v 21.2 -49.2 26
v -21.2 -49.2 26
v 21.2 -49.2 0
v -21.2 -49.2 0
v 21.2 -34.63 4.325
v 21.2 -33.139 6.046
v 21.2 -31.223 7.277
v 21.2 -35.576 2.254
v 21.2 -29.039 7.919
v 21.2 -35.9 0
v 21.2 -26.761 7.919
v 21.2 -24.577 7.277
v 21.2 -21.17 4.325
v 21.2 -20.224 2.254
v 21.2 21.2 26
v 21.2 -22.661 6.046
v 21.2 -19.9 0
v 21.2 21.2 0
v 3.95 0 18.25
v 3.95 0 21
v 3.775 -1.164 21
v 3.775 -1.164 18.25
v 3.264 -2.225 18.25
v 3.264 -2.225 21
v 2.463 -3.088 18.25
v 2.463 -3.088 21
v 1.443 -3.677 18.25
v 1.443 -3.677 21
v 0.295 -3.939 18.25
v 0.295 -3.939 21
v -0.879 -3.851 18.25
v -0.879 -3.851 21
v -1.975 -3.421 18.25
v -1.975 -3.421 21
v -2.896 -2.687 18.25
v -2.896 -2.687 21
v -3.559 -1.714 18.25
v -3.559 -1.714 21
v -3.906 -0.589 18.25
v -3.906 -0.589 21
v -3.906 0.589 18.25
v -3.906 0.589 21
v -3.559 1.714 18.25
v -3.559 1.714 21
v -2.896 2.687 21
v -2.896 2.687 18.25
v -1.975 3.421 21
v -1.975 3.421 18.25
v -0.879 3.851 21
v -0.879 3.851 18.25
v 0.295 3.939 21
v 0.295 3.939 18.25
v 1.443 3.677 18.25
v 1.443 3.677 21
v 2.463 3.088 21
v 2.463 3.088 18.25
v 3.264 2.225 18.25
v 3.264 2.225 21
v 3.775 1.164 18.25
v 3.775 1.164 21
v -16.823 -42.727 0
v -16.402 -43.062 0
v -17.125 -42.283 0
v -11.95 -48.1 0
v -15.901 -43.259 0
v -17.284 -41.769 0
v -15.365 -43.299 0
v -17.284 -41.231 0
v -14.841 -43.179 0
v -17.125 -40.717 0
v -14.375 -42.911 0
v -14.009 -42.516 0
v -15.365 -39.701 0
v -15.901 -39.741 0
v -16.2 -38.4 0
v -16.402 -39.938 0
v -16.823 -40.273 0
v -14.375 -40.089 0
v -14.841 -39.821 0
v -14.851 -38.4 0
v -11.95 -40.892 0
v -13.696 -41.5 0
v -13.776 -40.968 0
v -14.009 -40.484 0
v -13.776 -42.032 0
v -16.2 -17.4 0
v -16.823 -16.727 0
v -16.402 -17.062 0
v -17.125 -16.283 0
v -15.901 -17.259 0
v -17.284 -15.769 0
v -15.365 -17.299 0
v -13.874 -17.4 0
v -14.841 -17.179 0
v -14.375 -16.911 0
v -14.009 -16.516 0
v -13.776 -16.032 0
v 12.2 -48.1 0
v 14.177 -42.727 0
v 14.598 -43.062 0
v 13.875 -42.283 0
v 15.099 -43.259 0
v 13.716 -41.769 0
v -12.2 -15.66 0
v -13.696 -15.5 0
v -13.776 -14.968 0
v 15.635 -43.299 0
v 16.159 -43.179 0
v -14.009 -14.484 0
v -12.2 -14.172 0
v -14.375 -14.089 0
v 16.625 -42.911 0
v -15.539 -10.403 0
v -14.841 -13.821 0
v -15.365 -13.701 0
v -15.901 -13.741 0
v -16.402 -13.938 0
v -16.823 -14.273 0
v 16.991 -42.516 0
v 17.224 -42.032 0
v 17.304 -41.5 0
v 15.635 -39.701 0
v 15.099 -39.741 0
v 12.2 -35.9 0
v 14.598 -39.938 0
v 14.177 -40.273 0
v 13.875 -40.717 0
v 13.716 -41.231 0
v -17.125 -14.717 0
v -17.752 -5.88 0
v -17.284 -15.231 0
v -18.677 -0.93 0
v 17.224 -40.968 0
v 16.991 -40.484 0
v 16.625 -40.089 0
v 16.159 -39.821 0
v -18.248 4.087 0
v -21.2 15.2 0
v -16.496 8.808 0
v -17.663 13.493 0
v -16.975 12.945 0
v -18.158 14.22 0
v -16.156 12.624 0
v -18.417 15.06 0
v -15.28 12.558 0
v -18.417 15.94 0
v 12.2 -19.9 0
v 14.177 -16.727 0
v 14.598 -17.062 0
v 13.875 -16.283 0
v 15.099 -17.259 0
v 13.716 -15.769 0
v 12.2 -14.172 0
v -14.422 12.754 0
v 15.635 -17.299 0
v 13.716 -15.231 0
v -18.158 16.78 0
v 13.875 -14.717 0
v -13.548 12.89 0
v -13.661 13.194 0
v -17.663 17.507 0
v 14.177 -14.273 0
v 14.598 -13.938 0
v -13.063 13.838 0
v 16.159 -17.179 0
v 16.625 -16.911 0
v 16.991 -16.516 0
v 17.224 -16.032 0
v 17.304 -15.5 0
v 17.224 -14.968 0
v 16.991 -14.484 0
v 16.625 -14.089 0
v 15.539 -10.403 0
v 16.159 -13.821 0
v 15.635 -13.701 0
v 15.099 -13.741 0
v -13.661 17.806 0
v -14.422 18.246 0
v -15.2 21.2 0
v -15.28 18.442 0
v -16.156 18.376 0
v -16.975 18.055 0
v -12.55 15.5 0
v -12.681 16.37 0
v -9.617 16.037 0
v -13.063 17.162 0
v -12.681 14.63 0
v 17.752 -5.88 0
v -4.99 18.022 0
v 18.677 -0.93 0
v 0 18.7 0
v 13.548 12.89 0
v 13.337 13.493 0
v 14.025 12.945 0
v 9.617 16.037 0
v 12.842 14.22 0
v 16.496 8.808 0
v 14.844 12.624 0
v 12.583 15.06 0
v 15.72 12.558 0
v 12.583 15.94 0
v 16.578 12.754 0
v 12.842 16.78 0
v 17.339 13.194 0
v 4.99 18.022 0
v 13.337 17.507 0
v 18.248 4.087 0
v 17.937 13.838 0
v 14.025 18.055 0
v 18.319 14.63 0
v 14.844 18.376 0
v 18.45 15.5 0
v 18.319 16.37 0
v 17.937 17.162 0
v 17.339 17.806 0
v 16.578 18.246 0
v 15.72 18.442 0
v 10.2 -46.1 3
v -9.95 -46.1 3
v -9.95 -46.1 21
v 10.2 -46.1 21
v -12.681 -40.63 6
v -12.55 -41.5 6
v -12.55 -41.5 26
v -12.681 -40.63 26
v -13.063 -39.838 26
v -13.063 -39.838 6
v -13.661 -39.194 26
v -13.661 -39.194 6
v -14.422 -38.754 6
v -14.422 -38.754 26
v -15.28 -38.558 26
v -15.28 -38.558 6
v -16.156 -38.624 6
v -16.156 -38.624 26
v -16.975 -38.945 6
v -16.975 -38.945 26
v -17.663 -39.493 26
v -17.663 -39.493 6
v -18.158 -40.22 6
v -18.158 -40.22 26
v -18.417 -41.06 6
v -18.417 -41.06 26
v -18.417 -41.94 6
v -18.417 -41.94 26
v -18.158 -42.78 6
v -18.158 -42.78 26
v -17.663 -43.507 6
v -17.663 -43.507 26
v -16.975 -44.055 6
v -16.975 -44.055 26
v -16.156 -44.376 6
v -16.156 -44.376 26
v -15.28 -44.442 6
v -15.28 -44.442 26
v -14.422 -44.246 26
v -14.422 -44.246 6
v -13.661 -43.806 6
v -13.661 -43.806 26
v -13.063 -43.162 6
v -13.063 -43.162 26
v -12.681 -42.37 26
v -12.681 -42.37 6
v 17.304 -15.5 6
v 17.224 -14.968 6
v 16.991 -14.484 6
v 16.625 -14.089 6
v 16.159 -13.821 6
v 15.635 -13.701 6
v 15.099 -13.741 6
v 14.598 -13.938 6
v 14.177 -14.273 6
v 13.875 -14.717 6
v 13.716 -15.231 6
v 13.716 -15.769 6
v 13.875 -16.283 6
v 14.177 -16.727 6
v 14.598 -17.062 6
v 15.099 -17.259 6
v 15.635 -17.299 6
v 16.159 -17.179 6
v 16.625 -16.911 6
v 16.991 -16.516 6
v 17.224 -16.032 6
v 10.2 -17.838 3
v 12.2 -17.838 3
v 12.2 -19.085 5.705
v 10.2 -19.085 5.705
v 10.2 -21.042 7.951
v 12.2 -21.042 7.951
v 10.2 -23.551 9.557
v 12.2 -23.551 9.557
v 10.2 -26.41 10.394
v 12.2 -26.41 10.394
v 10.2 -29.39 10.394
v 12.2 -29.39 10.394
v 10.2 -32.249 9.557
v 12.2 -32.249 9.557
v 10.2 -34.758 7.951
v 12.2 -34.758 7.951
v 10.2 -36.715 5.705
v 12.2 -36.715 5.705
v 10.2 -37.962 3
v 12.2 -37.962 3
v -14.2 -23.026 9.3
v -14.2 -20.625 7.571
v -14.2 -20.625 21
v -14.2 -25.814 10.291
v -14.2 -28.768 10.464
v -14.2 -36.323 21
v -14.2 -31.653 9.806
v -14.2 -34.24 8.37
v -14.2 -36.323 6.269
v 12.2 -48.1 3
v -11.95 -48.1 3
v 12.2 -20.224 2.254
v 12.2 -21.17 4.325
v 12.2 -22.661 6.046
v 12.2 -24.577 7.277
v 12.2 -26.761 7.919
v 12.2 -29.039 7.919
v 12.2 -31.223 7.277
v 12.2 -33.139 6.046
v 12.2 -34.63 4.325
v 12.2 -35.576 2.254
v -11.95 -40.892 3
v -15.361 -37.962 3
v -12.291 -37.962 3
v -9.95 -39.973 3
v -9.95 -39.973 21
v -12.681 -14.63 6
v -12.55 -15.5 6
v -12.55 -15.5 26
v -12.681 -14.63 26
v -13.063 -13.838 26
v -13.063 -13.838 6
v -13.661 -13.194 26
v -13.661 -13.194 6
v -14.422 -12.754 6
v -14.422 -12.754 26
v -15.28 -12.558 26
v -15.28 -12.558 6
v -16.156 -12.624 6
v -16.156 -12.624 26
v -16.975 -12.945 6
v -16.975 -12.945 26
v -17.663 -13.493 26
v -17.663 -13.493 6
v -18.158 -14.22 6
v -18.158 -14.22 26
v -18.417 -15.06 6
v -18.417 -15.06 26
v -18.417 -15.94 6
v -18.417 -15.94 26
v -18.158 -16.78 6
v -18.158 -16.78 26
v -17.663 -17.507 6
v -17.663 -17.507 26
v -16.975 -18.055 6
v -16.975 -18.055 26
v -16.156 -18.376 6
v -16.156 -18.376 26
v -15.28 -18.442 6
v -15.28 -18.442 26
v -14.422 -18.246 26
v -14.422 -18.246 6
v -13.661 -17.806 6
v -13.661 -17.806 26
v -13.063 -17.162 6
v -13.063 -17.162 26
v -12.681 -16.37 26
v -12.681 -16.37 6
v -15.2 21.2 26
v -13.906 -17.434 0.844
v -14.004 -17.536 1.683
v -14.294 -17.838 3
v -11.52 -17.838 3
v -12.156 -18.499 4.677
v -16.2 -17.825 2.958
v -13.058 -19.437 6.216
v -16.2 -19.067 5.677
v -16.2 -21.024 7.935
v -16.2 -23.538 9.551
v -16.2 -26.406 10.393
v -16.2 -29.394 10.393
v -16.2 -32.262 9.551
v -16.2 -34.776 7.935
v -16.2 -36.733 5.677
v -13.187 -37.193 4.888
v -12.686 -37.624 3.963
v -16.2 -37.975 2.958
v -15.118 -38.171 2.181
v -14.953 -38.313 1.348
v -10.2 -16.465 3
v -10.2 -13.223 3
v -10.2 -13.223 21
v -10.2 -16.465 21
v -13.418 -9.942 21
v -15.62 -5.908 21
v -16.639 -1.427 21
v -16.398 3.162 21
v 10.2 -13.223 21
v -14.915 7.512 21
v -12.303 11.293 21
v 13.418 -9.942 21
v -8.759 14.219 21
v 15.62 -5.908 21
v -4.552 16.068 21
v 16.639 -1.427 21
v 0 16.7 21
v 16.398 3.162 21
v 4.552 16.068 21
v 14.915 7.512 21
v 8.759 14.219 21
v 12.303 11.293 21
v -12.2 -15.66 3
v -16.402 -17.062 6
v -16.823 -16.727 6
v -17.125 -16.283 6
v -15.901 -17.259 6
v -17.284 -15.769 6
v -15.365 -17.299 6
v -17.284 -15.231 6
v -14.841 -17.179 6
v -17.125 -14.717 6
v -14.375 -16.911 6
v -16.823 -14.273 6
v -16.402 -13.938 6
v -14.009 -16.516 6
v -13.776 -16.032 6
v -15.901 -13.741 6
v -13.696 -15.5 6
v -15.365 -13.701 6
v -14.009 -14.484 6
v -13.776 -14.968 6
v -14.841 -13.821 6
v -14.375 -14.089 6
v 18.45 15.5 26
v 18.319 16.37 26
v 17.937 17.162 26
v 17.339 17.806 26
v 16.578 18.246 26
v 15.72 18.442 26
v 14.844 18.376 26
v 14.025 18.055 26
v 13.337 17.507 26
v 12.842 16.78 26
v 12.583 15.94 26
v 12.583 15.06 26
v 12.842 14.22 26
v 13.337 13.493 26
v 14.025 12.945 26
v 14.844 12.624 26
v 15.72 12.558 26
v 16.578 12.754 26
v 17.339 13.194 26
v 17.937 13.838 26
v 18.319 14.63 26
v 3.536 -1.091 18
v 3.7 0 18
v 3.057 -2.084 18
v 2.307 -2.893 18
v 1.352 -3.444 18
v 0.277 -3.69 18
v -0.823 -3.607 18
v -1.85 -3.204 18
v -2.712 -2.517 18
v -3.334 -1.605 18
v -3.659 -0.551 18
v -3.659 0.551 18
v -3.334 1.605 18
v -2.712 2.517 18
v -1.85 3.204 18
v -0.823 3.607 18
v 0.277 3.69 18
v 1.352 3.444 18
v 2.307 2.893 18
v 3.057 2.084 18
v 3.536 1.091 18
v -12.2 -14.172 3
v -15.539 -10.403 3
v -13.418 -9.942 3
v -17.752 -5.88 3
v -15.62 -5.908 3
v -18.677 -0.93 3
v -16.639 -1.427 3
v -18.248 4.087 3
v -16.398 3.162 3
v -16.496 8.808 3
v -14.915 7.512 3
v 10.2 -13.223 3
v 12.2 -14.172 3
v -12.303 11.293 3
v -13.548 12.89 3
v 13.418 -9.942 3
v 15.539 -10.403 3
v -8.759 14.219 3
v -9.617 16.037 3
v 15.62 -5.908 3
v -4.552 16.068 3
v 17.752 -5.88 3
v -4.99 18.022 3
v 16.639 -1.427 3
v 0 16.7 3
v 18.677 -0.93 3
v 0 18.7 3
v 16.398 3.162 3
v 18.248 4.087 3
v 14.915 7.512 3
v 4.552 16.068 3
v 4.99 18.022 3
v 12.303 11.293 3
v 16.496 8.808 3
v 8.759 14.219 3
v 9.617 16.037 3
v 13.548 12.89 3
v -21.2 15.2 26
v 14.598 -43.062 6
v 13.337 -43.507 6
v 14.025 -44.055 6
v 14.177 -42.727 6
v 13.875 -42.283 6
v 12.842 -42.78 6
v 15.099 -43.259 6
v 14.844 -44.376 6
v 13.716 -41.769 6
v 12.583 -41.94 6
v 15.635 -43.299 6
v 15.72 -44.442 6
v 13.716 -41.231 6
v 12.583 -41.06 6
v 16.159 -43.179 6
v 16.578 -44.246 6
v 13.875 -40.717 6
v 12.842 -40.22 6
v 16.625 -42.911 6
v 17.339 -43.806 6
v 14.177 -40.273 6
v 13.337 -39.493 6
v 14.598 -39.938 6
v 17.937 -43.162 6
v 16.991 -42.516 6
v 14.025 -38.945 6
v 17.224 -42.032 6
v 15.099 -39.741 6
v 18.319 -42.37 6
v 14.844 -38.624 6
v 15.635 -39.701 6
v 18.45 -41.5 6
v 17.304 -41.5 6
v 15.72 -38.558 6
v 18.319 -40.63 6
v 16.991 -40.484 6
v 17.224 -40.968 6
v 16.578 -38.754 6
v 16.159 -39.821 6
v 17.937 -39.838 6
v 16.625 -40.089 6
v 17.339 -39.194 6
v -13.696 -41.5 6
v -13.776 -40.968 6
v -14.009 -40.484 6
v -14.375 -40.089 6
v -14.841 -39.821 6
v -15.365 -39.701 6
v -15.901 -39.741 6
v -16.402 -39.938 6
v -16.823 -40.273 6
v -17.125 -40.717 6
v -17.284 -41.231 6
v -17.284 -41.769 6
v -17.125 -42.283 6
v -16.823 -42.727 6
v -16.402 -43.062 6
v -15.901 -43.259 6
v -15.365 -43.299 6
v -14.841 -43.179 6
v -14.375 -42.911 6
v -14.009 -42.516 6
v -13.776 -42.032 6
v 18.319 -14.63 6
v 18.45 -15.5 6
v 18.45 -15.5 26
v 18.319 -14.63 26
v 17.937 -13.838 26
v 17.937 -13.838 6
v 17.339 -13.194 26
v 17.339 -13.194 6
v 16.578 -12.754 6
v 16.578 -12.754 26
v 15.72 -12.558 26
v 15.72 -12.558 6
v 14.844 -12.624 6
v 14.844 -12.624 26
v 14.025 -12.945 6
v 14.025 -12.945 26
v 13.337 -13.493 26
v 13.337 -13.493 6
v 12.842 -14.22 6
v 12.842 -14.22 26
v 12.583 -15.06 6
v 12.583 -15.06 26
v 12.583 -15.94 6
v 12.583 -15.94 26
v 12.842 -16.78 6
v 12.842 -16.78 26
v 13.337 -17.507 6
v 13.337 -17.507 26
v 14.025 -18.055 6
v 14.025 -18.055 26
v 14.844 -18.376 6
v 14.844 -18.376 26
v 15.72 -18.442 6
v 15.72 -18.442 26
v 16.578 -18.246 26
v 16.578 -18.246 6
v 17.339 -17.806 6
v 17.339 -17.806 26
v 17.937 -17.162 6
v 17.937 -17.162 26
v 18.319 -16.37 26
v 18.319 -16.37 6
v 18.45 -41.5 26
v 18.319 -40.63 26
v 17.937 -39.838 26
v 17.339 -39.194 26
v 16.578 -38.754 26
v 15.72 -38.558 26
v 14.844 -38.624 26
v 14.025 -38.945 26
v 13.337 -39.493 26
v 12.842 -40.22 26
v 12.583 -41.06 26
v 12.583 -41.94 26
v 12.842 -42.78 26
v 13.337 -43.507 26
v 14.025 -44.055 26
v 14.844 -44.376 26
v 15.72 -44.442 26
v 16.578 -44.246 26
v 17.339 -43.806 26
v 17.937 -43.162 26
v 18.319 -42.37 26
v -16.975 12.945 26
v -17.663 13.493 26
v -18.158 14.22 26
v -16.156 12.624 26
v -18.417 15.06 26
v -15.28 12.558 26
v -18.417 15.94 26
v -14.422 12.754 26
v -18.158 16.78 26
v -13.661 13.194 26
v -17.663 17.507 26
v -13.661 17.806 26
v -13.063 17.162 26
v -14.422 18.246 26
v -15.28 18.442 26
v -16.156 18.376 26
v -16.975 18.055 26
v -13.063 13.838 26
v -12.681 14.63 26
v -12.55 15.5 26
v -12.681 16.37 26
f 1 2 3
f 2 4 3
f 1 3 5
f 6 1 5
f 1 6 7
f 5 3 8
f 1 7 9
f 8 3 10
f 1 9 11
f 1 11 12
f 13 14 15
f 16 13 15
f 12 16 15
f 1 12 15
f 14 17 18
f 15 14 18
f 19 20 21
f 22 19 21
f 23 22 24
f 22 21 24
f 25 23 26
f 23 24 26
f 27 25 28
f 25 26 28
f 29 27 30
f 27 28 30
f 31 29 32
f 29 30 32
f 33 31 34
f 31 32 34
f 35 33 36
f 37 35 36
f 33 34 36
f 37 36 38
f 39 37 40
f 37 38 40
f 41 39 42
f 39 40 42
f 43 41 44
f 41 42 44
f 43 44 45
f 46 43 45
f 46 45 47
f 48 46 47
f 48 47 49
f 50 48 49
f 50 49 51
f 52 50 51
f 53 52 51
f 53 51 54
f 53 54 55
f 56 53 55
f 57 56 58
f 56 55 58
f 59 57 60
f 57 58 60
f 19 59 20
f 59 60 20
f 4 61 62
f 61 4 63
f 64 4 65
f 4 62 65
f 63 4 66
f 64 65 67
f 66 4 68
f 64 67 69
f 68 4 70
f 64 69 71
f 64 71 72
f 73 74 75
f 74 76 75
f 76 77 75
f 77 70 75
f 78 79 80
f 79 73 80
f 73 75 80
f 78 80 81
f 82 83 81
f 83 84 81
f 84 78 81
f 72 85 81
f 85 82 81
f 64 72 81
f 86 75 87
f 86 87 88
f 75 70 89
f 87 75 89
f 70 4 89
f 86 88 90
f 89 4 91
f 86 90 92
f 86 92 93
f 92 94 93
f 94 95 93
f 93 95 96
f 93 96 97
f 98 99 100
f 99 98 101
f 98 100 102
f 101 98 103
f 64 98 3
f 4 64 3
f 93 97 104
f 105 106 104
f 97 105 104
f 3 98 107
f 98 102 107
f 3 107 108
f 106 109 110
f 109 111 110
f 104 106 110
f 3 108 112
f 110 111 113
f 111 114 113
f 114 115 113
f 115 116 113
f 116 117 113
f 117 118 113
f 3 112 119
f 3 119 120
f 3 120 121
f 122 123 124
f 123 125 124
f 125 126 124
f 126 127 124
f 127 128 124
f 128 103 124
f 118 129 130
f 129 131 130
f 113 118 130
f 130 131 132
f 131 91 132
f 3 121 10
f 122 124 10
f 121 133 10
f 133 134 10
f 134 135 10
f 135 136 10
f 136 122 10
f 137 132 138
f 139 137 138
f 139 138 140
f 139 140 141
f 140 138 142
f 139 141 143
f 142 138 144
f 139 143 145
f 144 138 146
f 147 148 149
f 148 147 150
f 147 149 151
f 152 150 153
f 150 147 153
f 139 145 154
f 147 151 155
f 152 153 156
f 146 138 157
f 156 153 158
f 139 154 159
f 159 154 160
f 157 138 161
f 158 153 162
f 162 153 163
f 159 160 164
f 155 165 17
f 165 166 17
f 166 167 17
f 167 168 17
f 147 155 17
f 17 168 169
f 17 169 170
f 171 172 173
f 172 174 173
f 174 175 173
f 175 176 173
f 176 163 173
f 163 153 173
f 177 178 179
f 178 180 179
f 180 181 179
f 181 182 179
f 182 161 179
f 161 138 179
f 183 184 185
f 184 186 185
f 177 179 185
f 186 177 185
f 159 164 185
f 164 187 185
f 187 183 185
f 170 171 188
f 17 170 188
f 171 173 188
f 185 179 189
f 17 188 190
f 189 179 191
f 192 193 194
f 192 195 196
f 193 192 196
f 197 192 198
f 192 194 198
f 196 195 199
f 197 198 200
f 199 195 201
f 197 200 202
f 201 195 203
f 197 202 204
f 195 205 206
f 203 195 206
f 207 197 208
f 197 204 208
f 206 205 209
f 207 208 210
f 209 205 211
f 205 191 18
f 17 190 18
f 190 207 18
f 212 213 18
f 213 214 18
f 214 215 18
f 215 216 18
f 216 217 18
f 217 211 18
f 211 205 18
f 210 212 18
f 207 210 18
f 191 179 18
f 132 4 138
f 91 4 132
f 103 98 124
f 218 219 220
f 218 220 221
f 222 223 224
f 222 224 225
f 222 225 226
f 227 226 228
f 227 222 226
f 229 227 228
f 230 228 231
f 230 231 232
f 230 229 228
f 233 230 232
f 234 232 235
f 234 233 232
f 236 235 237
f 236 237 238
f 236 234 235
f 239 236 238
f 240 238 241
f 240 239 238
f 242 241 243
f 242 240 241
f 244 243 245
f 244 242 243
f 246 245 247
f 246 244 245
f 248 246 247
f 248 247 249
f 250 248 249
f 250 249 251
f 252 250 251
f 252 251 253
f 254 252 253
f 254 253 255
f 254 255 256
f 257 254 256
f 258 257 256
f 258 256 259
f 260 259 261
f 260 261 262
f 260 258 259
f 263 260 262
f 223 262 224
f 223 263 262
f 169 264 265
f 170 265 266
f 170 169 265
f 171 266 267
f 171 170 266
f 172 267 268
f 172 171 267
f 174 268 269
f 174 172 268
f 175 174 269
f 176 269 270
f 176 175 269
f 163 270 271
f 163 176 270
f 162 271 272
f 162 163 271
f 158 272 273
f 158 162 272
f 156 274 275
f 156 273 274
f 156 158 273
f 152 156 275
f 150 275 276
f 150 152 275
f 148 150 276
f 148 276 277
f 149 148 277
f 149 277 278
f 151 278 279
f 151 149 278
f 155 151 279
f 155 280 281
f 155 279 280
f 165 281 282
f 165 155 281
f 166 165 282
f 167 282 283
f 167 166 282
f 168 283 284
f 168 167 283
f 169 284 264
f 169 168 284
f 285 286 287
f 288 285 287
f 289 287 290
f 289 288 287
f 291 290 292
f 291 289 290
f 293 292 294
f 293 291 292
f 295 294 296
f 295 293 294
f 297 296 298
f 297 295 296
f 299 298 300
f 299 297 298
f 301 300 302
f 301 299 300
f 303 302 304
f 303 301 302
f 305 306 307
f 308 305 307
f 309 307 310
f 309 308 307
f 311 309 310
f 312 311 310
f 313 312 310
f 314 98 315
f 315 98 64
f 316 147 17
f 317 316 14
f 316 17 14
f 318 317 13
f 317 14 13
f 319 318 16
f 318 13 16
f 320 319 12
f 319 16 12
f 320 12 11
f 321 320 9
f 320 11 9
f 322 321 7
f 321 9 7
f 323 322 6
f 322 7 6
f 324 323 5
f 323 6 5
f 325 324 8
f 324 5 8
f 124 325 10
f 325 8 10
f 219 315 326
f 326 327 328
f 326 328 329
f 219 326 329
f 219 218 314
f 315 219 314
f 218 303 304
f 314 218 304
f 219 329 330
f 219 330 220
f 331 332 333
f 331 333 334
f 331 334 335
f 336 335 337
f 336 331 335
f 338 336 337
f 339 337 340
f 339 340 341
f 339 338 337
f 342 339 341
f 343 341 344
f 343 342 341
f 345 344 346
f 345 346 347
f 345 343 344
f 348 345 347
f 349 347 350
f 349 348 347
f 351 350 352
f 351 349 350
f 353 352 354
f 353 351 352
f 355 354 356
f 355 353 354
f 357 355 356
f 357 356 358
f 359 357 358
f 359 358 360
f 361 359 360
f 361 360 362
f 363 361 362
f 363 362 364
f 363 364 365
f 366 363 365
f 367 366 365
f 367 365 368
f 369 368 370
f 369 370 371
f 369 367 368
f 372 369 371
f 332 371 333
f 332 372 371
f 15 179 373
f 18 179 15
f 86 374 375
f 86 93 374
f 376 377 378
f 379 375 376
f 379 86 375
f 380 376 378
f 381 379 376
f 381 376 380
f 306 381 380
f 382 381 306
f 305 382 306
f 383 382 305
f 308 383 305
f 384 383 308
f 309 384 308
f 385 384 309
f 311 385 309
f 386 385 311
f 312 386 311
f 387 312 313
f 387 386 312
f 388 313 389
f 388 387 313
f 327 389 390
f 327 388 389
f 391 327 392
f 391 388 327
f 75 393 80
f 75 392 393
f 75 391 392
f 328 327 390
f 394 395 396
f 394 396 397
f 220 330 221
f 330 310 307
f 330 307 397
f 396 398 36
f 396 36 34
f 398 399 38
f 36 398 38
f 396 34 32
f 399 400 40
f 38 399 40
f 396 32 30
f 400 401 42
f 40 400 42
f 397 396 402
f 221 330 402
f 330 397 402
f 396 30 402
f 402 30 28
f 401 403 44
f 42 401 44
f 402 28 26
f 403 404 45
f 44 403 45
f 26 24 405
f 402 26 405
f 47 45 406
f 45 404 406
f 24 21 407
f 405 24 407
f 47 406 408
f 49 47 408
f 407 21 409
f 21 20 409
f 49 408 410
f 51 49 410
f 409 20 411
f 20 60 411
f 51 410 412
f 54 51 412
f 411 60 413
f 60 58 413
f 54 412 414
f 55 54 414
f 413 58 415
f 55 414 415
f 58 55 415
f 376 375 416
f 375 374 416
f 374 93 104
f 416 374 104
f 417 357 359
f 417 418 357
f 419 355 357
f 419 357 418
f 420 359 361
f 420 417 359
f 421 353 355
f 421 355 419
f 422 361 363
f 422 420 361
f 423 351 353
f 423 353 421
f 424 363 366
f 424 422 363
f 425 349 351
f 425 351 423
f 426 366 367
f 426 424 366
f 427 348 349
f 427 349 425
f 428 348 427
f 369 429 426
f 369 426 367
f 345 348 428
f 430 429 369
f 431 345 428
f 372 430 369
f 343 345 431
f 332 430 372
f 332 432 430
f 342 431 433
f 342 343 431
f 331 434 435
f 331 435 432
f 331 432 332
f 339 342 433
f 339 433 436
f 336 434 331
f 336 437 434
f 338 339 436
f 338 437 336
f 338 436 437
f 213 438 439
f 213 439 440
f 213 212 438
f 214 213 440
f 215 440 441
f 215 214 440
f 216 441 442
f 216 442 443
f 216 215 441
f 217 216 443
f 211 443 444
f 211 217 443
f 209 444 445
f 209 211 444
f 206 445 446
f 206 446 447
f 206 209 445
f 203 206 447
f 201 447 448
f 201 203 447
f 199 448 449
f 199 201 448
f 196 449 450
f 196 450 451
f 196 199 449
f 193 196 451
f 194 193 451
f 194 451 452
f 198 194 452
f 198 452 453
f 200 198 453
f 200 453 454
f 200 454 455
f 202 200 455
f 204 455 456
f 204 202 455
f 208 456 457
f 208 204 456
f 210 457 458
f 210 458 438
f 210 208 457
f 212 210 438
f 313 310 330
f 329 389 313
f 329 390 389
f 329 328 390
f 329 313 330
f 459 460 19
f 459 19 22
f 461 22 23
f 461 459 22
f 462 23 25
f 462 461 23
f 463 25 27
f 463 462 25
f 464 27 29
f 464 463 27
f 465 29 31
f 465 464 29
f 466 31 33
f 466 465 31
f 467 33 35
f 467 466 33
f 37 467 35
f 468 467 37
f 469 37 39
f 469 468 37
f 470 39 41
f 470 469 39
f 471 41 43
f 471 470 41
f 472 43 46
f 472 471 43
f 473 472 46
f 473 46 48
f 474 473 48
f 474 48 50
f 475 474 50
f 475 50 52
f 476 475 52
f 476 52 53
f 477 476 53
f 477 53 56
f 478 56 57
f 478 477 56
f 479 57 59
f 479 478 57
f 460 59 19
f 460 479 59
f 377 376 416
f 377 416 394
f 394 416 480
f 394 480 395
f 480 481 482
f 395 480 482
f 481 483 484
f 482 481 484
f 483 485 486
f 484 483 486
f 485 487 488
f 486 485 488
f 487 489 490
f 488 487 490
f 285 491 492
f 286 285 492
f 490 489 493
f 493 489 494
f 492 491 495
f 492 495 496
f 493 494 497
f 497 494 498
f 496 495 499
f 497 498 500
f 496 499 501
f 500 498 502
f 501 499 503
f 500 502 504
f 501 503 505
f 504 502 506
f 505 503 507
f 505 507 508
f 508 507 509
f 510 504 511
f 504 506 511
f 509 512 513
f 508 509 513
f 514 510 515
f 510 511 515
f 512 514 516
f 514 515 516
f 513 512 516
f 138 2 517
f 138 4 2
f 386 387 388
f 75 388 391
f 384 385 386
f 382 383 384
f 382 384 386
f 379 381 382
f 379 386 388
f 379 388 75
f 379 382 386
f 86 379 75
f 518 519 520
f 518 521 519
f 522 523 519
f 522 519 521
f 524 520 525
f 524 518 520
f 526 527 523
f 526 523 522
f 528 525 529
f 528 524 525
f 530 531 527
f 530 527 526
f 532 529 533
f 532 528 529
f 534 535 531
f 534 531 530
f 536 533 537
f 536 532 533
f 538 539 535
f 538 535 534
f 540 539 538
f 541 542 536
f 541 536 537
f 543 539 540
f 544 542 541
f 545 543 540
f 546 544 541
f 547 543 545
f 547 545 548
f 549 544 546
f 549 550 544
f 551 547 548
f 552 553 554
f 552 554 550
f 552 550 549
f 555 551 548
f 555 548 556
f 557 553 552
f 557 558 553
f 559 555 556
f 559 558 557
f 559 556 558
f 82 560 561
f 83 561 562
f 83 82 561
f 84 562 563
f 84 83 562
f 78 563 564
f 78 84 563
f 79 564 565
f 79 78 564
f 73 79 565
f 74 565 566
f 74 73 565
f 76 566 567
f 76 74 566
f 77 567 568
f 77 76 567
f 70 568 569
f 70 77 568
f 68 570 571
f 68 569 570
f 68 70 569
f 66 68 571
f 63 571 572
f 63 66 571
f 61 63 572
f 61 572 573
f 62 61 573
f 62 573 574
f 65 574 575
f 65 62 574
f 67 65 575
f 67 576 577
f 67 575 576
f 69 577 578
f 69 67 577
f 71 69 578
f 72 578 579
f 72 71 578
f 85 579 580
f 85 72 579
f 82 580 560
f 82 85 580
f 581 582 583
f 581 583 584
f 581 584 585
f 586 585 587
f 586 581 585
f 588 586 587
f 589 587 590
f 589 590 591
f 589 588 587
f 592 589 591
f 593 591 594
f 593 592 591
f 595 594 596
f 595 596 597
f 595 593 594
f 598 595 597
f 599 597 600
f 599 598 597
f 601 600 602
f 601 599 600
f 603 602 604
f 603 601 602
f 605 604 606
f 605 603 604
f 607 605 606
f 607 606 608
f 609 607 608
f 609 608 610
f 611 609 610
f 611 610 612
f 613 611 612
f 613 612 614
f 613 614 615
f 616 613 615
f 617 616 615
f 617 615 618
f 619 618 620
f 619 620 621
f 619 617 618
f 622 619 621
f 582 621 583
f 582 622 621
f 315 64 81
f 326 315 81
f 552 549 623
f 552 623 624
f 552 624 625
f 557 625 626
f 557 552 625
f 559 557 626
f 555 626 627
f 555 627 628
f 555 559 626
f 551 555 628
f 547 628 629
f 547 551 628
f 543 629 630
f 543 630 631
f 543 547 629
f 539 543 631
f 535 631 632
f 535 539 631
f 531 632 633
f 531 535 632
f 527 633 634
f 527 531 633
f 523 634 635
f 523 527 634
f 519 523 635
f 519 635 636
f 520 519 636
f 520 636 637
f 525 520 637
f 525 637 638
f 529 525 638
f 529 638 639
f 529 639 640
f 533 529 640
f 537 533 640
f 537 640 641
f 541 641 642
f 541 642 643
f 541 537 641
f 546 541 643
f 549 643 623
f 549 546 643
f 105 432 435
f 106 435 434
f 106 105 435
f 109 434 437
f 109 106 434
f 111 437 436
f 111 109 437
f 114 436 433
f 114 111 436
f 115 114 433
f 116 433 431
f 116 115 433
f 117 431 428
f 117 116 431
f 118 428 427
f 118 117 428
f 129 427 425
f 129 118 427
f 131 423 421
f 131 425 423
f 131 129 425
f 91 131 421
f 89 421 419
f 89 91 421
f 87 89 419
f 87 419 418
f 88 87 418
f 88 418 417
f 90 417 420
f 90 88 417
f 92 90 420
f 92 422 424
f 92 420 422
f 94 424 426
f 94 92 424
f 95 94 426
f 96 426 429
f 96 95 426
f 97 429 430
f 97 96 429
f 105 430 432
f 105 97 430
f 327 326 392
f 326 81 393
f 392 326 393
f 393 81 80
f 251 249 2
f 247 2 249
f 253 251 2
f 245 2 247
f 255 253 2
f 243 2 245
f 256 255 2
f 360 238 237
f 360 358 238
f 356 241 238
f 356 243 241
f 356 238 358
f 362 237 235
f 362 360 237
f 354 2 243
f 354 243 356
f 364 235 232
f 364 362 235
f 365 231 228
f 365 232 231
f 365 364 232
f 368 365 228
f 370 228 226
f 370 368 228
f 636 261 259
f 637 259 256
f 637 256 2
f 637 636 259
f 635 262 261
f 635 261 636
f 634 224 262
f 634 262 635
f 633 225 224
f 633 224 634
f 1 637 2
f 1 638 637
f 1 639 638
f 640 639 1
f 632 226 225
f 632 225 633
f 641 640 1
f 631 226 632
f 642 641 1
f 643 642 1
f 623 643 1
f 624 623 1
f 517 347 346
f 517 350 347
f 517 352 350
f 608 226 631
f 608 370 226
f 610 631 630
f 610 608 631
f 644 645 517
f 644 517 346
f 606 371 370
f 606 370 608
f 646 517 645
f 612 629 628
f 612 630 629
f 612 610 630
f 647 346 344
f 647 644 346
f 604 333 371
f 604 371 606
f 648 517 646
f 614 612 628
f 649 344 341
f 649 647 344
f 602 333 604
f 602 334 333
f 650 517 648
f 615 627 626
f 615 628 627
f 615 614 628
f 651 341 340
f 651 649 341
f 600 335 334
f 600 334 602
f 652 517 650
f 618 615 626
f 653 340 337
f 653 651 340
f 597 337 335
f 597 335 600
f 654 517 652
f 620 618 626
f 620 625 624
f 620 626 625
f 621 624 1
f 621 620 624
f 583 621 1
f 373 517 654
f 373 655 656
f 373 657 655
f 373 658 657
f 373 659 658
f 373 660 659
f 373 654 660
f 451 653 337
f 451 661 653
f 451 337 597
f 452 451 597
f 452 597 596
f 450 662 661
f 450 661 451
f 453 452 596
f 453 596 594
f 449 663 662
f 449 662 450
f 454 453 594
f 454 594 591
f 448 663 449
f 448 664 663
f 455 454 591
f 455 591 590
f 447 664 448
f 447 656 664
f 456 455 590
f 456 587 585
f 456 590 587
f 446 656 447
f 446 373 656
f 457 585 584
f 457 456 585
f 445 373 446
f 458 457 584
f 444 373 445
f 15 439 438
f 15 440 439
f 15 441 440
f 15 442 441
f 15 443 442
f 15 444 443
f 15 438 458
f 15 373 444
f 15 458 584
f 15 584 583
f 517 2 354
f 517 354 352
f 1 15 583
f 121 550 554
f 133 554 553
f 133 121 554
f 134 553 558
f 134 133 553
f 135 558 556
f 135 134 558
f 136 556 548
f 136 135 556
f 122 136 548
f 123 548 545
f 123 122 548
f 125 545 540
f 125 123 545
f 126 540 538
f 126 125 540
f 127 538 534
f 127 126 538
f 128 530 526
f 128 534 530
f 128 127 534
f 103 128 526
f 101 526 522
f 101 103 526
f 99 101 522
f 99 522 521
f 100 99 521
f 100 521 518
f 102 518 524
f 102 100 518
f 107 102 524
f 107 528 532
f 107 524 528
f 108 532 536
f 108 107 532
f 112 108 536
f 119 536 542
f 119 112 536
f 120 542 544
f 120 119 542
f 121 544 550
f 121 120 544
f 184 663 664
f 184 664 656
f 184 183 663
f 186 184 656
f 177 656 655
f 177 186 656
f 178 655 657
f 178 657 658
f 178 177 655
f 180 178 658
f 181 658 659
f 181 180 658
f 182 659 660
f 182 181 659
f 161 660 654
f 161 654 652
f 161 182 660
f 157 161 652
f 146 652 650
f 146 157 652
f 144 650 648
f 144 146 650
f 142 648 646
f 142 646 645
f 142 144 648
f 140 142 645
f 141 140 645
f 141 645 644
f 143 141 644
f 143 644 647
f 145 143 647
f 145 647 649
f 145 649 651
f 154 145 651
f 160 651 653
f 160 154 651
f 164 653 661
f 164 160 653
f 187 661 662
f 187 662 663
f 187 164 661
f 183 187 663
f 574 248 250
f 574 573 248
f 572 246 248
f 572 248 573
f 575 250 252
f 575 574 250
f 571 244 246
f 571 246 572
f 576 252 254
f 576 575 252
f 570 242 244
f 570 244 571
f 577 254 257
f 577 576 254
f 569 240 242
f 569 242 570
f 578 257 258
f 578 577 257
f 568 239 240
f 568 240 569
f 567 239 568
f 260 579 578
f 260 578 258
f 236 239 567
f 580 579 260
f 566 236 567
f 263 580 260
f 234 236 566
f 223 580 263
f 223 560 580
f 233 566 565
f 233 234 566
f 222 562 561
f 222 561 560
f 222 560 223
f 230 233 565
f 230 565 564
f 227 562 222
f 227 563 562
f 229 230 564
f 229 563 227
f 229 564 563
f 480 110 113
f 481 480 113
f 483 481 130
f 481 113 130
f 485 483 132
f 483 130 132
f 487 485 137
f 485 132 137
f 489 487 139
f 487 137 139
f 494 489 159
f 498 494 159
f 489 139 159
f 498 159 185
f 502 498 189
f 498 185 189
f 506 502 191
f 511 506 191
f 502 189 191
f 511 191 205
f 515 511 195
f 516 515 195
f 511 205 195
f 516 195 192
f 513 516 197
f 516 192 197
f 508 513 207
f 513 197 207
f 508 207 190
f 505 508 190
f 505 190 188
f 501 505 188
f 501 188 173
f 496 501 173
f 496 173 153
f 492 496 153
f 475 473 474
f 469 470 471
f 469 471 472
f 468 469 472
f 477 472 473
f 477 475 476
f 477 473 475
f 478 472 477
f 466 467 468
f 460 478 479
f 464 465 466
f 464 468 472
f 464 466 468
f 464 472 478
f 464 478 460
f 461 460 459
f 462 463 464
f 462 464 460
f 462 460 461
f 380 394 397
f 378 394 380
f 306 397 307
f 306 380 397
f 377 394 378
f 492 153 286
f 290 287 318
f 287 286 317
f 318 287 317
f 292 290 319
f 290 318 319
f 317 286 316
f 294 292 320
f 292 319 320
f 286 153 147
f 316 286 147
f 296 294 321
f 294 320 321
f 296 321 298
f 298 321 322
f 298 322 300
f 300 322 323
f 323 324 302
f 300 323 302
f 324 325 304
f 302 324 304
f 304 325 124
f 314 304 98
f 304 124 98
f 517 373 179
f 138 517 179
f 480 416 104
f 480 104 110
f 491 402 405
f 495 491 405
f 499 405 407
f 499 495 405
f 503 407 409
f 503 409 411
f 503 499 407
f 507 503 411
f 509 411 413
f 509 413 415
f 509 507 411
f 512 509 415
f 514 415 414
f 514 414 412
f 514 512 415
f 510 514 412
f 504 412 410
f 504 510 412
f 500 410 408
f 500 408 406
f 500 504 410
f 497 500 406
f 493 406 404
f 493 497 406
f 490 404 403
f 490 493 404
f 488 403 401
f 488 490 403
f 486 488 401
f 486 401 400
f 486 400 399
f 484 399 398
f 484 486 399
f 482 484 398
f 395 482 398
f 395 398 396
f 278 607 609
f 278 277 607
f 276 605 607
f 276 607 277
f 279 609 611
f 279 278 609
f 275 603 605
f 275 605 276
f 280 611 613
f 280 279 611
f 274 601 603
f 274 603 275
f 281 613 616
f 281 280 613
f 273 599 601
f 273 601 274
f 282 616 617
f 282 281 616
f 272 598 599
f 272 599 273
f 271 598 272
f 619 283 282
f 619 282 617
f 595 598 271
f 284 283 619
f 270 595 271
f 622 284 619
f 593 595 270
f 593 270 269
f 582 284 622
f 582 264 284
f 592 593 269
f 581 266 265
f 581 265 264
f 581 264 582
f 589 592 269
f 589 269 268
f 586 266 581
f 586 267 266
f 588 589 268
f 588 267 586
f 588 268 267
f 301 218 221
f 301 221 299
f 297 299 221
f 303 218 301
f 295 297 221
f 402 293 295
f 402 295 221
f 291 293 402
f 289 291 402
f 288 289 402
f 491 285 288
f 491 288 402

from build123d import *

# Parameters (mm, degrees)
SKETCH2_R           = 2.15
SKETCH2_R_2         = 1.804126588
SKETCH2_R_3         = 2.95
SKETCH2_W           = 9
SKETCH2_H           = 16
BOSS_EXTRUDE1_DEPTH = 3
SKETCH7_W           = 42.4
SKETCH7_H           = 70.4
SKETCH7_R           = 1.804126588
SKETCH7_R_2         = 2.95
BOSS_EXTRUDE4_DEPTH = 18
SKETCH3_W           = 42.4
SKETCH3_H           = 70.4
BOSS_EXTRUDE2_DEPTH = 5
CUT_EXTRUDE1_START  = -20
SKETCH4_R           = 2.95
CUT_EXTRUDE1_DEPTH  = 20
CUT_EXTRUDE2_REACH  = 71.96
SKETCH5_R           = 8
CUT_EXTRUDE3_START  = -11
SKETCH8_R           = 10.5
CUT_EXTRUDE3_DEPTH  = 2
CUT_EXTRUDE4_START  = -37.4
SKETCH8_2_R         = 10.5
CUT_EXTRUDE4_DEPTH  = 4.680146
CHAMFER1_SIZE       = 6
SKETCH6_R           = 3.95
BOSS_EXTRUDE3_DEPTH = 3
CHAMFER2_SIZE       = 0.25


with BuildPart() as part:
    # Sketch2 → Boss-Extrude1 (new body)
    # profile 1 of 4: a face of its own
    with BuildSketch(Plane.XY):
        with BuildLine():
            Line((21.2, -35.9), (12.2, -35.9))
            Line((12.2, -35.9), (12.2, -38.4))
            Line((12.2, -38.4), (12.2, -48.1))
            Line((12.2, -48.1), (-11.95, -48.1))
            Line((-11.95, -48.1), (-11.95, -40.891869727))
            Line((-11.95, -40.891869727), (-16.2, -37.241869727))
            Line((-16.2, -37.241869727), (-16.2, -19.819444087))
            Line((-16.2, -19.819444087), (-12.2, -15.659508007))
            Line((-12.2, -15.659508007), (-12.2, -14.172155799))
            ThreePointArc((-12.2, -14.172155799), (0, 18.7), (12.2, -14.172155799))
            Line((12.2, -14.172155799), (12.2, -17.4))
            Line((12.2, -17.4), (12.2, -19.9))
            Line((12.2, -19.9), (21.2, -19.9))
            Line((21.2, -19.9), (21.2, 21.2))
            Line((21.2, 21.2), (-13.2, 21.2))
            Line((-13.2, 21.2), (-21.2, 21.2))
            Line((-21.2, 21.2), (-21.2, -49.2))
            Line((-21.2, -49.2), (-9, -49.2))
            Line((-9, -49.2), (11.2, -49.2))
            Line((11.2, -49.2), (21.2, -49.2))
            Line((21.2, -49.2), (21.2, -35.9))
        make_face()
        with Locations((-15.5, -41.5)):
            Circle(SKETCH2_R, mode=Mode.SUBTRACT)
        with Locations((15.5, -41.5)):
            Circle(SKETCH2_R, mode=Mode.SUBTRACT)
        with Locations((-15.5, -15.5)):
            Circle(SKETCH2_R_2, mode=Mode.SUBTRACT)
        with Locations((-15.5, 15.5)):
            Circle(SKETCH2_R_3, mode=Mode.SUBTRACT)
        with Locations((15.5, -15.5)):
            Circle(SKETCH2_R_2, mode=Mode.SUBTRACT)
        with Locations((15.5, 15.5)):
            Circle(SKETCH2_R_3, mode=Mode.SUBTRACT)
    # profile 2 of 4: a face of its own
    with BuildSketch(Plane.XY):
        with Locations((16.7, -27.9)):
            Rectangle(SKETCH2_W, SKETCH2_H)
    # profile 3 of 4: a face of its own
    with BuildSketch(Plane.XY):
        with Locations((-15.5, -41.5)):
            Circle(SKETCH2_R)
        with Locations((-15.5, -41.5)):
            Circle(SKETCH2_R_2, mode=Mode.SUBTRACT)
    # profile 4 of 4: a face of its own
    with BuildSketch(Plane.XY):
        with Locations((15.5, -41.5)):
            Circle(SKETCH2_R)
        with Locations((15.5, -41.5)):
            Circle(SKETCH2_R_2, mode=Mode.SUBTRACT)
    extrude(amount=BOSS_EXTRUDE1_DEPTH)

    # Sketch7 → Boss-Extrude4 (add)
    with BuildSketch(Plane.XY.offset(3)):
        with Locations((0, -14)):
            Rectangle(SKETCH7_W, SKETCH7_H)
        with Locations((15.5, -41.5)):
            Circle(SKETCH7_R, mode=Mode.SUBTRACT)
        with Locations((-15.5, -41.5)):
            Circle(SKETCH7_R, mode=Mode.SUBTRACT)
        with Locations((-15.5, -15.5)):
            Circle(SKETCH7_R, mode=Mode.SUBTRACT)
        with Locations((15.5, -15.5)):
            Circle(SKETCH7_R, mode=Mode.SUBTRACT)
        with Locations((15.5, 15.5)):
            Circle(SKETCH7_R_2, mode=Mode.SUBTRACT)
        with Locations((-15.5, 15.5)):
            Circle(SKETCH7_R_2, mode=Mode.SUBTRACT)
        with BuildLine():
            Line((10.2, -46.1), (10.2, -13.223085873))
            ThreePointArc((10.2, -13.223085873), (0, 16.7), (-10.2, -13.223085873))
            Line((-10.2, -13.223085873), (-10.2, -16.465067137))
            Line((-10.2, -16.465067137), (-14.2, -20.625003217))
            Line((-14.2, -20.625003217), (-14.2, -36.323172457))
            Line((-14.2, -36.323172457), (-9.95, -39.973172457))
            Line((-9.95, -39.973172457), (-9.95, -46.1))
            Line((-9.95, -46.1), (10.2, -46.1))
        make_face(mode=Mode.SUBTRACT)
    extrude(amount=BOSS_EXTRUDE4_DEPTH)

    # Sketch3 → Boss-Extrude2 (add)
    with BuildSketch(Plane.XY.offset(21)):
        with Locations((0, -14)):
            Rectangle(SKETCH3_W, SKETCH3_H)
    extrude(amount=BOSS_EXTRUDE2_DEPTH)

    # Sketch4 → Cut-Extrude1 (cut)
    with BuildSketch(Plane.XY.offset(26).offset(CUT_EXTRUDE1_START)):
        with Locations((-15.5, -15.5)):
            Circle(SKETCH4_R)
        with Locations((15.5, -15.5)):
            Circle(SKETCH4_R)
        with Locations((-15.5, -41.5)):
            Circle(SKETCH4_R)
        with Locations((15.5, -41.5)):
            Circle(SKETCH4_R)
        with Locations((-15.5, 15.5)):
            Circle(SKETCH4_R)
        with Locations((15.5, 15.5)):
            Circle(SKETCH4_R)
    extrude(amount=CUT_EXTRUDE1_DEPTH, mode=Mode.SUBTRACT)

    # Sketch5 → Cut-Extrude2 (cut, up to next)
    with BuildSketch(Plane(origin=(21.2, 0, 0), x_dir=(0, 0, -1), z_dir=(1, 0, 0)), mode=Mode.PRIVATE) as cut_extrude2_sk1:
        with Locations((0, -27.9)):
            Circle(SKETCH5_R)
    cut_extrude2_tool1 = extrude(cut_extrude2_sk1.sketch, amount=-CUT_EXTRUDE2_REACH, mode=Mode.PRIVATE) & part.part
    add(cut_extrude2_tool1.solids().sort_by_distance((21.2, -27.9, 0))[0], mode=Mode.SUBTRACT)

    # Sketch8 → Cut-Extrude3 (cut)
    with BuildSketch(Plane(origin=(21.2, 0, 0), x_dir=(0, 0, -1), z_dir=(1, 0, 0)).offset(CUT_EXTRUDE3_START)):
        with Locations((0, -27.9)):
            Circle(SKETCH8_R)
    extrude(amount=CUT_EXTRUDE3_DEPTH, mode=Mode.SUBTRACT)

    # Sketch8<2> → Cut-Extrude4 (cut)
    with BuildSketch(Plane(origin=(21.2, 0, 0), x_dir=(0, 0, -1), z_dir=(1, 0, 0)).offset(CUT_EXTRUDE4_START)):
        with Locations((0, -27.9)):
            Circle(SKETCH8_2_R)
    extrude(amount=CUT_EXTRUDE4_DEPTH, mode=Mode.SUBTRACT)

    # Chamfer1
    chamfer1_edges = [part.edges().sort_by_distance(p)[0] for p in [
        (-21.2, 21.2, 13),
    ]]
    chamfer(chamfer1_edges, length=CHAMFER1_SIZE)

    # Sketch6 → Boss-Extrude3 (add)
    with BuildSketch(Plane(origin=(0, 0, 21), x_dir=(-1, 0, 0), z_dir=(0, 0, -1))):
        with Locations(Location((0, 0, 0), (0, 0, 180))):
            Circle(SKETCH6_R)
    extrude(amount=BOSS_EXTRUDE3_DEPTH)

    # Chamfer2
    chamfer2_edges = [part.edges().sort_by_distance(p)[0] for p in [
        (-3.95, 0, 18),
    ]]
    chamfer(chamfer2_edges, length=CHAMFER2_SIZE)


solid = part.part
